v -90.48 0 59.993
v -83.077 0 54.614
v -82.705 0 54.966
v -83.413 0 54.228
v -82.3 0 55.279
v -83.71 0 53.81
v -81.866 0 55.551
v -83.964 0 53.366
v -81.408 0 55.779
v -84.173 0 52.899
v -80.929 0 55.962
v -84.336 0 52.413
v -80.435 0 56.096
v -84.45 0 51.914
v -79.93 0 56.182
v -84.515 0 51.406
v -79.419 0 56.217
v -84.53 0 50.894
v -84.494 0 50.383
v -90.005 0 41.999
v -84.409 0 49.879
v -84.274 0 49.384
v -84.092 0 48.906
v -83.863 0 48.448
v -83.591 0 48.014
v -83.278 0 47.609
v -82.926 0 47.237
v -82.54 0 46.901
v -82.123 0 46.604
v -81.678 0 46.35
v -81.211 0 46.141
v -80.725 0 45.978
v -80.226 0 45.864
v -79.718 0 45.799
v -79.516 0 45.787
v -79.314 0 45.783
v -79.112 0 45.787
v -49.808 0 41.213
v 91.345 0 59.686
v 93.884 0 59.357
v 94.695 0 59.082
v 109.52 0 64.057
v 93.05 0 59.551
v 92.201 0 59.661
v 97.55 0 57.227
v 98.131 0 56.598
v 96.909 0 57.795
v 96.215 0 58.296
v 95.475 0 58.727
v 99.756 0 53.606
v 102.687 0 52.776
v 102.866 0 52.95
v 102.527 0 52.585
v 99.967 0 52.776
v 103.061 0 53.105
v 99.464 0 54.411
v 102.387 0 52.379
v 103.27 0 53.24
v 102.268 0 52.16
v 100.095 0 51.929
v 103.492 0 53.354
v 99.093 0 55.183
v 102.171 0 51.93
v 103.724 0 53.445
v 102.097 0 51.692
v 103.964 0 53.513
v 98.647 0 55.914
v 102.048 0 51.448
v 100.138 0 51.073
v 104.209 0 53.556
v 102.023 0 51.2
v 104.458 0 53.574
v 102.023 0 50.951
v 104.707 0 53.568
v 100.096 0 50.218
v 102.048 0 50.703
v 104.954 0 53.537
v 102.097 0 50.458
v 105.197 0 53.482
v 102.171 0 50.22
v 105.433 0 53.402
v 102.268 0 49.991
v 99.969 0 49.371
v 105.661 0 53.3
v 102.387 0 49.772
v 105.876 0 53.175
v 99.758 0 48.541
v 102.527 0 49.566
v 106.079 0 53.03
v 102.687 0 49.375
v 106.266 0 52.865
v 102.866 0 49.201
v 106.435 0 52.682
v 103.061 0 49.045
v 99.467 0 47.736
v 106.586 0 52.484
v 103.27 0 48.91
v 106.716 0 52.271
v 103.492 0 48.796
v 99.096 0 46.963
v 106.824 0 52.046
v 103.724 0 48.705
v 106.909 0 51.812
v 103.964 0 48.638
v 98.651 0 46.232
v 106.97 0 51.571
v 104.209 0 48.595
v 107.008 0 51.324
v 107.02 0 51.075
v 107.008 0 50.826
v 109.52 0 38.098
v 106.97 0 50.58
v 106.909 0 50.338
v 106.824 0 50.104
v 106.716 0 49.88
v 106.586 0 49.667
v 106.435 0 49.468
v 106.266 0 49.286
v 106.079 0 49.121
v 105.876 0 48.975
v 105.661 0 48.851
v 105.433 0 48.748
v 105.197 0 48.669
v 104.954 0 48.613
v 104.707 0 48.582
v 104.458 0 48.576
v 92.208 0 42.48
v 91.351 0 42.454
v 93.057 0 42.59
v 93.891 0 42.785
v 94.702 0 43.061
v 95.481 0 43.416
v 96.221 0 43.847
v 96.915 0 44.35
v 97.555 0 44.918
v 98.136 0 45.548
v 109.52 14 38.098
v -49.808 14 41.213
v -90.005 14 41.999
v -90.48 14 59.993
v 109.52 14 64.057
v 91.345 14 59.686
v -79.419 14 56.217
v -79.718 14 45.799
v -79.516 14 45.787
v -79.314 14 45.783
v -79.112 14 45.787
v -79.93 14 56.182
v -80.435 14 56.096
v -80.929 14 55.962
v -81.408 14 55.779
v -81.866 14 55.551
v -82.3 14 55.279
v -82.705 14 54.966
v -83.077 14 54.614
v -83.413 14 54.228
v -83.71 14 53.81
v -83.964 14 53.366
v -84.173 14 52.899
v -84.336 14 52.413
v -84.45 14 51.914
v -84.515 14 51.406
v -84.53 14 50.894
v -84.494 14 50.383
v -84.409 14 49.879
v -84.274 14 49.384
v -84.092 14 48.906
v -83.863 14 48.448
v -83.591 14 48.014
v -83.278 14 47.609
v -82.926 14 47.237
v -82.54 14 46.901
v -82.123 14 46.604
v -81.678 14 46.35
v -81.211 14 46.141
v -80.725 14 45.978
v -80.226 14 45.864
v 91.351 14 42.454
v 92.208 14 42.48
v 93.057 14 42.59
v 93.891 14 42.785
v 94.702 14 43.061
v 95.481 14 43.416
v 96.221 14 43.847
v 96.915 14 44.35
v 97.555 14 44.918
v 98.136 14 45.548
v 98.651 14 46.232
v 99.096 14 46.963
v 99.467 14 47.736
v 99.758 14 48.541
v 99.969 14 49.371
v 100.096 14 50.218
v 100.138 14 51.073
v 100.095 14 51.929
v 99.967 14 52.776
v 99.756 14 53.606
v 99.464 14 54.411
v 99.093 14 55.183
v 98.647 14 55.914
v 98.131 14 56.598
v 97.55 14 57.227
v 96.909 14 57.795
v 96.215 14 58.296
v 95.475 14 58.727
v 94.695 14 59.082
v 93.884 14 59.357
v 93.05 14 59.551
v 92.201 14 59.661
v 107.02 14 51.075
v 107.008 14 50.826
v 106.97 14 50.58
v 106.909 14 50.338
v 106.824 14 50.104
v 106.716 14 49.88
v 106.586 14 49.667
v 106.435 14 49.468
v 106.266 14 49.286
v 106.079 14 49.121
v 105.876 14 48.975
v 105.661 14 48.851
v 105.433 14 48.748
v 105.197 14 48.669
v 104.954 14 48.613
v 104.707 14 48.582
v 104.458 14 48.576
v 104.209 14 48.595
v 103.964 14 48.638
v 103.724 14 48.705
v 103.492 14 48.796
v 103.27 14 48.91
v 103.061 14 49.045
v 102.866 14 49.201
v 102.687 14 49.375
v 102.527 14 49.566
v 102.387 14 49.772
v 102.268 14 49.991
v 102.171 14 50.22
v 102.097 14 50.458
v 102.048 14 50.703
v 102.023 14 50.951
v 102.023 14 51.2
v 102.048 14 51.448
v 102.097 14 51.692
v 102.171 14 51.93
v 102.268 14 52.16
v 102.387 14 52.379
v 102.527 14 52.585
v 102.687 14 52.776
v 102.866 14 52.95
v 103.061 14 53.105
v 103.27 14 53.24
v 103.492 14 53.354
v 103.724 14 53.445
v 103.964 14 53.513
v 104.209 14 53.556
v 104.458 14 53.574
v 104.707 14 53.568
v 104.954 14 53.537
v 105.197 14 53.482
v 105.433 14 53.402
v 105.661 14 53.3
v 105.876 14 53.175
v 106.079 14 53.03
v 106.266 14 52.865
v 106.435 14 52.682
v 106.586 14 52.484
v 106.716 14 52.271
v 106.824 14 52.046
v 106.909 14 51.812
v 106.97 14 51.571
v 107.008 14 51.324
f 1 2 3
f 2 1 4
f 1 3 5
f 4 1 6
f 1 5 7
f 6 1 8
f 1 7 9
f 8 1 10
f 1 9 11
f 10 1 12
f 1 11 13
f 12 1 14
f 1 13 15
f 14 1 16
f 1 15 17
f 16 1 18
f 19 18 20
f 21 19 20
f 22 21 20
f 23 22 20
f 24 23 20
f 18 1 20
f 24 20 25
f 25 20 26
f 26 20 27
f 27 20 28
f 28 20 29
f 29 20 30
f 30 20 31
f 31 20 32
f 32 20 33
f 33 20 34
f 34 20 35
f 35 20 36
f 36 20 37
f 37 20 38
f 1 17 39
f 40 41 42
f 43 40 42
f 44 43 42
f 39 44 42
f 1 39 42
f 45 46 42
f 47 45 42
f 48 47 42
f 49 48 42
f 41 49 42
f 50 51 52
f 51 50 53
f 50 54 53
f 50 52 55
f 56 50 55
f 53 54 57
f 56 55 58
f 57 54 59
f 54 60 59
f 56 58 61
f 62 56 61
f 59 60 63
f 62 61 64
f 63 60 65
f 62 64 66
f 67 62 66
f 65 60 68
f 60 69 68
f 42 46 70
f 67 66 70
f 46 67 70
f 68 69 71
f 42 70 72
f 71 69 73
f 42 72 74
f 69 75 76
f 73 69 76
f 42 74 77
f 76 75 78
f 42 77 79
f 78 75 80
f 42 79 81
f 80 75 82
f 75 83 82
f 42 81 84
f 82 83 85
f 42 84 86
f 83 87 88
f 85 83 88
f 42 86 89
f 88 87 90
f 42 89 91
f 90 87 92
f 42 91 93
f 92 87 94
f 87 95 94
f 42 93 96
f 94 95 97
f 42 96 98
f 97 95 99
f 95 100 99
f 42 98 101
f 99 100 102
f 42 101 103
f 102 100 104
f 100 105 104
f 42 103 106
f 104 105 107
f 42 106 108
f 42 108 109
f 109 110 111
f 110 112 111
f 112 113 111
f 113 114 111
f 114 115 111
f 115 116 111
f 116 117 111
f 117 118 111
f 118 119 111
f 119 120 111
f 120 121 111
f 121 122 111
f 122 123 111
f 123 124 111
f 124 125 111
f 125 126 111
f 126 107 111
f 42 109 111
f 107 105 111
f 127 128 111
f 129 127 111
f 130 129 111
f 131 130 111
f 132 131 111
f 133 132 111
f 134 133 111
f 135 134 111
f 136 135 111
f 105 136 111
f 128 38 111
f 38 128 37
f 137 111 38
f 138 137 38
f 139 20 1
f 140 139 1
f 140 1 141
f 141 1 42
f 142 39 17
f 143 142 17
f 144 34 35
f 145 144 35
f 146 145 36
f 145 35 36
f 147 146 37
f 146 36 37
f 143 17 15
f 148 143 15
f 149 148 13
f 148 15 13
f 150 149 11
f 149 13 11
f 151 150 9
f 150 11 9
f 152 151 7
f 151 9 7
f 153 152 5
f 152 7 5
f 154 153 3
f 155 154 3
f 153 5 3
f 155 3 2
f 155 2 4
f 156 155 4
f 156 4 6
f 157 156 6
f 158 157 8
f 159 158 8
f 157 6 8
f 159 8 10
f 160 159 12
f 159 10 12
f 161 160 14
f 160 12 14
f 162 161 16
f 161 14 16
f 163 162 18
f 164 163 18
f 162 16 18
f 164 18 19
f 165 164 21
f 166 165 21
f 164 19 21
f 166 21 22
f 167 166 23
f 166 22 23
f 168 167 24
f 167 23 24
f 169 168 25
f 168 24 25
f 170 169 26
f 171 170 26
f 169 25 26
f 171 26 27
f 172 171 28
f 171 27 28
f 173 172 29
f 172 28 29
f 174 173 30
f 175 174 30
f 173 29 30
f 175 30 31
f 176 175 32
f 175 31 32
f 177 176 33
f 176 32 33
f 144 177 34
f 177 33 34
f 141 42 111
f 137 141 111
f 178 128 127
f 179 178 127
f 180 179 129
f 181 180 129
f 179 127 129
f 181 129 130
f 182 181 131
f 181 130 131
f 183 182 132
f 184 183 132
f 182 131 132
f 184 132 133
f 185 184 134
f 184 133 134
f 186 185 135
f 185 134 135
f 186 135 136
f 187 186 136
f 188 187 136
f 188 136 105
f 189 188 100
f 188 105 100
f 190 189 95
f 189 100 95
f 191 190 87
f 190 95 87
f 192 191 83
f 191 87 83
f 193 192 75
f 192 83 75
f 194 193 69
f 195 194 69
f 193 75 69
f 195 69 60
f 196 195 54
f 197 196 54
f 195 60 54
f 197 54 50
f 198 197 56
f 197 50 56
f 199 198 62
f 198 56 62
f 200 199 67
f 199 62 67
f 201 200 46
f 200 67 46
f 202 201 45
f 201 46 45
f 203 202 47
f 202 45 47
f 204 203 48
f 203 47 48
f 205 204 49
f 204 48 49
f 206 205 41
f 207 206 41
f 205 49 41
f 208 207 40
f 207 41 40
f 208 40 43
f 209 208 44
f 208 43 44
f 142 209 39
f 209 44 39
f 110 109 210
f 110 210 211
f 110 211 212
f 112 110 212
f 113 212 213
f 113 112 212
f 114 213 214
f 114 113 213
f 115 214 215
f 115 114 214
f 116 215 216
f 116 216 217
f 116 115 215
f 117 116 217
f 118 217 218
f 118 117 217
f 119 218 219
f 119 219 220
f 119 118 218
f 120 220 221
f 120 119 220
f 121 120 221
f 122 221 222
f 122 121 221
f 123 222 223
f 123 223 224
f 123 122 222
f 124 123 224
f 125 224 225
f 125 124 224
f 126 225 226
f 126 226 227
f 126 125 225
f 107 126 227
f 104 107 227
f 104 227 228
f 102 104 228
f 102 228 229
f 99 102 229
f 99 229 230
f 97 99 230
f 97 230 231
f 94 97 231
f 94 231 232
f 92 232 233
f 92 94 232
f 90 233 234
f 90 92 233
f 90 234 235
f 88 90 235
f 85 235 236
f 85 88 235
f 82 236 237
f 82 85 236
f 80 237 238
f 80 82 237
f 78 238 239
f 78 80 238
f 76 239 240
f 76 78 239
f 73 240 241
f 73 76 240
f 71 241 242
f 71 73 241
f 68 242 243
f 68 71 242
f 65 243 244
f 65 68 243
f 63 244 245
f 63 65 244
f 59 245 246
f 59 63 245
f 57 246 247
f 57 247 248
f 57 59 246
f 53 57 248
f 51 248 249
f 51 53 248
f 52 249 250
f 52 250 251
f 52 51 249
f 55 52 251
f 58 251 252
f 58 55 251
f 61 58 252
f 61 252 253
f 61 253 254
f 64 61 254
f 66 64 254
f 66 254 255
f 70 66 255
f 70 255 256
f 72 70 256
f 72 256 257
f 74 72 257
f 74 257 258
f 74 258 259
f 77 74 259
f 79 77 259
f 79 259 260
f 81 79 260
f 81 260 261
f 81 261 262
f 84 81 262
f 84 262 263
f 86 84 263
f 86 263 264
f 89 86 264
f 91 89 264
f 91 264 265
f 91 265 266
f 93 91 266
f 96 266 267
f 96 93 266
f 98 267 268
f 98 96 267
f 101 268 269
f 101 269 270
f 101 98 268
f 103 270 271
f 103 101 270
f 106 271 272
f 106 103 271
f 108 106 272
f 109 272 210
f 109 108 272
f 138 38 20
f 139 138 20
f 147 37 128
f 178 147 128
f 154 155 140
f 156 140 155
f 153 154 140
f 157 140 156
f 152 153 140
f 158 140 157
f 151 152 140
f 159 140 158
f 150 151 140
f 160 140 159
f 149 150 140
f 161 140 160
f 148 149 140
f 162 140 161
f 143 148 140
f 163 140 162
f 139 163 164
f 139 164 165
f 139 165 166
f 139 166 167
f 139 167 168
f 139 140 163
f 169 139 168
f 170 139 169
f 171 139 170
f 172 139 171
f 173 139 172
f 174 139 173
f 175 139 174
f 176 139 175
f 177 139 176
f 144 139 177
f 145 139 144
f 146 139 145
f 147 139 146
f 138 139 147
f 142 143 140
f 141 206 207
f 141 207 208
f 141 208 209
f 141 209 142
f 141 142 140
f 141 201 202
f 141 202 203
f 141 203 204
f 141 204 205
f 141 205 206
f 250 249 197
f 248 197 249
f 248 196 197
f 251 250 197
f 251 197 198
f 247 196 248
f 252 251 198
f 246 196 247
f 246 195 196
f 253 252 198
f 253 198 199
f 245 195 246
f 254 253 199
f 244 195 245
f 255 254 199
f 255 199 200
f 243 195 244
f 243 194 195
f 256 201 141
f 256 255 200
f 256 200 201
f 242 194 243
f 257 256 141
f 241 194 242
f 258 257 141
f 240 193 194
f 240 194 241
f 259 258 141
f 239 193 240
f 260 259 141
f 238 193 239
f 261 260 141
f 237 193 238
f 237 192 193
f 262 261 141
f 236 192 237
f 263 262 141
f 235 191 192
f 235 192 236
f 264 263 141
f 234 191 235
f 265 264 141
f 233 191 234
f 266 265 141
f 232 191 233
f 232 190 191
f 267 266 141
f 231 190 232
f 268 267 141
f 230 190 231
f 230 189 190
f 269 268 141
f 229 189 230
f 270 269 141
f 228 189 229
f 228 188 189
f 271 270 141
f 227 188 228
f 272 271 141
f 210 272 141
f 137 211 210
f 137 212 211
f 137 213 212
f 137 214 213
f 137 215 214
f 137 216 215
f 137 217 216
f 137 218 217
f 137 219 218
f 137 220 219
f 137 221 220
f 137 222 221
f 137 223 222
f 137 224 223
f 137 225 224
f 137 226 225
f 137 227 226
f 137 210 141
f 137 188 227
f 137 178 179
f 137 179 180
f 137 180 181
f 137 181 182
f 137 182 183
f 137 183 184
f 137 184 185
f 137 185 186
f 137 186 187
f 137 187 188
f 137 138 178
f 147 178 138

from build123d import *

# Parameters (mm, degrees)
SKETCH1_R           = 2.5
BOSS_EXTRUDE1_DEPTH = 14


with BuildPart() as part:
    # Sketch1 → Boss-Extrude1 (new body)
    with BuildSketch(Plane(origin=(0, 0, 0), x_dir=(1, 0, 0), z_dir=(0, 1, 0))):
        Polygon((-49.807795153, -41.213348306), (-90.005103209, -41.999399148), (-90.480022259, -59.993132832), (109.519977741, -64.056767627), (109.519977741, -38.097723503), align=None)
        with BuildLine():
            Line((-79.112188034, -45.787154937), (91.351489969, -42.453769592))
            ThreePointArc((91.351489969, -42.453769592), (100.137803397, -51.073442227), (91.344504386, -59.685988453))
            Line((91.344504386, -59.685988453), (-79.419326147, -56.217040409))
            ThreePointArc((-79.419326147, -56.217040409), (-84.528615041, -51.150292406), (-79.718159034, -45.799004587))
            ThreePointArc((-79.718159034, -45.799004587), (-79.415345745, -45.784273175), (-79.112188034, -45.787154937))
        make_face(mode=Mode.SUBTRACT)
        with Locations((104.519977741, -51.075218669)):
            Circle(SKETCH1_R, mode=Mode.SUBTRACT)
    extrude(amount=BOSS_EXTRUDE1_DEPTH)


solid = part.part
